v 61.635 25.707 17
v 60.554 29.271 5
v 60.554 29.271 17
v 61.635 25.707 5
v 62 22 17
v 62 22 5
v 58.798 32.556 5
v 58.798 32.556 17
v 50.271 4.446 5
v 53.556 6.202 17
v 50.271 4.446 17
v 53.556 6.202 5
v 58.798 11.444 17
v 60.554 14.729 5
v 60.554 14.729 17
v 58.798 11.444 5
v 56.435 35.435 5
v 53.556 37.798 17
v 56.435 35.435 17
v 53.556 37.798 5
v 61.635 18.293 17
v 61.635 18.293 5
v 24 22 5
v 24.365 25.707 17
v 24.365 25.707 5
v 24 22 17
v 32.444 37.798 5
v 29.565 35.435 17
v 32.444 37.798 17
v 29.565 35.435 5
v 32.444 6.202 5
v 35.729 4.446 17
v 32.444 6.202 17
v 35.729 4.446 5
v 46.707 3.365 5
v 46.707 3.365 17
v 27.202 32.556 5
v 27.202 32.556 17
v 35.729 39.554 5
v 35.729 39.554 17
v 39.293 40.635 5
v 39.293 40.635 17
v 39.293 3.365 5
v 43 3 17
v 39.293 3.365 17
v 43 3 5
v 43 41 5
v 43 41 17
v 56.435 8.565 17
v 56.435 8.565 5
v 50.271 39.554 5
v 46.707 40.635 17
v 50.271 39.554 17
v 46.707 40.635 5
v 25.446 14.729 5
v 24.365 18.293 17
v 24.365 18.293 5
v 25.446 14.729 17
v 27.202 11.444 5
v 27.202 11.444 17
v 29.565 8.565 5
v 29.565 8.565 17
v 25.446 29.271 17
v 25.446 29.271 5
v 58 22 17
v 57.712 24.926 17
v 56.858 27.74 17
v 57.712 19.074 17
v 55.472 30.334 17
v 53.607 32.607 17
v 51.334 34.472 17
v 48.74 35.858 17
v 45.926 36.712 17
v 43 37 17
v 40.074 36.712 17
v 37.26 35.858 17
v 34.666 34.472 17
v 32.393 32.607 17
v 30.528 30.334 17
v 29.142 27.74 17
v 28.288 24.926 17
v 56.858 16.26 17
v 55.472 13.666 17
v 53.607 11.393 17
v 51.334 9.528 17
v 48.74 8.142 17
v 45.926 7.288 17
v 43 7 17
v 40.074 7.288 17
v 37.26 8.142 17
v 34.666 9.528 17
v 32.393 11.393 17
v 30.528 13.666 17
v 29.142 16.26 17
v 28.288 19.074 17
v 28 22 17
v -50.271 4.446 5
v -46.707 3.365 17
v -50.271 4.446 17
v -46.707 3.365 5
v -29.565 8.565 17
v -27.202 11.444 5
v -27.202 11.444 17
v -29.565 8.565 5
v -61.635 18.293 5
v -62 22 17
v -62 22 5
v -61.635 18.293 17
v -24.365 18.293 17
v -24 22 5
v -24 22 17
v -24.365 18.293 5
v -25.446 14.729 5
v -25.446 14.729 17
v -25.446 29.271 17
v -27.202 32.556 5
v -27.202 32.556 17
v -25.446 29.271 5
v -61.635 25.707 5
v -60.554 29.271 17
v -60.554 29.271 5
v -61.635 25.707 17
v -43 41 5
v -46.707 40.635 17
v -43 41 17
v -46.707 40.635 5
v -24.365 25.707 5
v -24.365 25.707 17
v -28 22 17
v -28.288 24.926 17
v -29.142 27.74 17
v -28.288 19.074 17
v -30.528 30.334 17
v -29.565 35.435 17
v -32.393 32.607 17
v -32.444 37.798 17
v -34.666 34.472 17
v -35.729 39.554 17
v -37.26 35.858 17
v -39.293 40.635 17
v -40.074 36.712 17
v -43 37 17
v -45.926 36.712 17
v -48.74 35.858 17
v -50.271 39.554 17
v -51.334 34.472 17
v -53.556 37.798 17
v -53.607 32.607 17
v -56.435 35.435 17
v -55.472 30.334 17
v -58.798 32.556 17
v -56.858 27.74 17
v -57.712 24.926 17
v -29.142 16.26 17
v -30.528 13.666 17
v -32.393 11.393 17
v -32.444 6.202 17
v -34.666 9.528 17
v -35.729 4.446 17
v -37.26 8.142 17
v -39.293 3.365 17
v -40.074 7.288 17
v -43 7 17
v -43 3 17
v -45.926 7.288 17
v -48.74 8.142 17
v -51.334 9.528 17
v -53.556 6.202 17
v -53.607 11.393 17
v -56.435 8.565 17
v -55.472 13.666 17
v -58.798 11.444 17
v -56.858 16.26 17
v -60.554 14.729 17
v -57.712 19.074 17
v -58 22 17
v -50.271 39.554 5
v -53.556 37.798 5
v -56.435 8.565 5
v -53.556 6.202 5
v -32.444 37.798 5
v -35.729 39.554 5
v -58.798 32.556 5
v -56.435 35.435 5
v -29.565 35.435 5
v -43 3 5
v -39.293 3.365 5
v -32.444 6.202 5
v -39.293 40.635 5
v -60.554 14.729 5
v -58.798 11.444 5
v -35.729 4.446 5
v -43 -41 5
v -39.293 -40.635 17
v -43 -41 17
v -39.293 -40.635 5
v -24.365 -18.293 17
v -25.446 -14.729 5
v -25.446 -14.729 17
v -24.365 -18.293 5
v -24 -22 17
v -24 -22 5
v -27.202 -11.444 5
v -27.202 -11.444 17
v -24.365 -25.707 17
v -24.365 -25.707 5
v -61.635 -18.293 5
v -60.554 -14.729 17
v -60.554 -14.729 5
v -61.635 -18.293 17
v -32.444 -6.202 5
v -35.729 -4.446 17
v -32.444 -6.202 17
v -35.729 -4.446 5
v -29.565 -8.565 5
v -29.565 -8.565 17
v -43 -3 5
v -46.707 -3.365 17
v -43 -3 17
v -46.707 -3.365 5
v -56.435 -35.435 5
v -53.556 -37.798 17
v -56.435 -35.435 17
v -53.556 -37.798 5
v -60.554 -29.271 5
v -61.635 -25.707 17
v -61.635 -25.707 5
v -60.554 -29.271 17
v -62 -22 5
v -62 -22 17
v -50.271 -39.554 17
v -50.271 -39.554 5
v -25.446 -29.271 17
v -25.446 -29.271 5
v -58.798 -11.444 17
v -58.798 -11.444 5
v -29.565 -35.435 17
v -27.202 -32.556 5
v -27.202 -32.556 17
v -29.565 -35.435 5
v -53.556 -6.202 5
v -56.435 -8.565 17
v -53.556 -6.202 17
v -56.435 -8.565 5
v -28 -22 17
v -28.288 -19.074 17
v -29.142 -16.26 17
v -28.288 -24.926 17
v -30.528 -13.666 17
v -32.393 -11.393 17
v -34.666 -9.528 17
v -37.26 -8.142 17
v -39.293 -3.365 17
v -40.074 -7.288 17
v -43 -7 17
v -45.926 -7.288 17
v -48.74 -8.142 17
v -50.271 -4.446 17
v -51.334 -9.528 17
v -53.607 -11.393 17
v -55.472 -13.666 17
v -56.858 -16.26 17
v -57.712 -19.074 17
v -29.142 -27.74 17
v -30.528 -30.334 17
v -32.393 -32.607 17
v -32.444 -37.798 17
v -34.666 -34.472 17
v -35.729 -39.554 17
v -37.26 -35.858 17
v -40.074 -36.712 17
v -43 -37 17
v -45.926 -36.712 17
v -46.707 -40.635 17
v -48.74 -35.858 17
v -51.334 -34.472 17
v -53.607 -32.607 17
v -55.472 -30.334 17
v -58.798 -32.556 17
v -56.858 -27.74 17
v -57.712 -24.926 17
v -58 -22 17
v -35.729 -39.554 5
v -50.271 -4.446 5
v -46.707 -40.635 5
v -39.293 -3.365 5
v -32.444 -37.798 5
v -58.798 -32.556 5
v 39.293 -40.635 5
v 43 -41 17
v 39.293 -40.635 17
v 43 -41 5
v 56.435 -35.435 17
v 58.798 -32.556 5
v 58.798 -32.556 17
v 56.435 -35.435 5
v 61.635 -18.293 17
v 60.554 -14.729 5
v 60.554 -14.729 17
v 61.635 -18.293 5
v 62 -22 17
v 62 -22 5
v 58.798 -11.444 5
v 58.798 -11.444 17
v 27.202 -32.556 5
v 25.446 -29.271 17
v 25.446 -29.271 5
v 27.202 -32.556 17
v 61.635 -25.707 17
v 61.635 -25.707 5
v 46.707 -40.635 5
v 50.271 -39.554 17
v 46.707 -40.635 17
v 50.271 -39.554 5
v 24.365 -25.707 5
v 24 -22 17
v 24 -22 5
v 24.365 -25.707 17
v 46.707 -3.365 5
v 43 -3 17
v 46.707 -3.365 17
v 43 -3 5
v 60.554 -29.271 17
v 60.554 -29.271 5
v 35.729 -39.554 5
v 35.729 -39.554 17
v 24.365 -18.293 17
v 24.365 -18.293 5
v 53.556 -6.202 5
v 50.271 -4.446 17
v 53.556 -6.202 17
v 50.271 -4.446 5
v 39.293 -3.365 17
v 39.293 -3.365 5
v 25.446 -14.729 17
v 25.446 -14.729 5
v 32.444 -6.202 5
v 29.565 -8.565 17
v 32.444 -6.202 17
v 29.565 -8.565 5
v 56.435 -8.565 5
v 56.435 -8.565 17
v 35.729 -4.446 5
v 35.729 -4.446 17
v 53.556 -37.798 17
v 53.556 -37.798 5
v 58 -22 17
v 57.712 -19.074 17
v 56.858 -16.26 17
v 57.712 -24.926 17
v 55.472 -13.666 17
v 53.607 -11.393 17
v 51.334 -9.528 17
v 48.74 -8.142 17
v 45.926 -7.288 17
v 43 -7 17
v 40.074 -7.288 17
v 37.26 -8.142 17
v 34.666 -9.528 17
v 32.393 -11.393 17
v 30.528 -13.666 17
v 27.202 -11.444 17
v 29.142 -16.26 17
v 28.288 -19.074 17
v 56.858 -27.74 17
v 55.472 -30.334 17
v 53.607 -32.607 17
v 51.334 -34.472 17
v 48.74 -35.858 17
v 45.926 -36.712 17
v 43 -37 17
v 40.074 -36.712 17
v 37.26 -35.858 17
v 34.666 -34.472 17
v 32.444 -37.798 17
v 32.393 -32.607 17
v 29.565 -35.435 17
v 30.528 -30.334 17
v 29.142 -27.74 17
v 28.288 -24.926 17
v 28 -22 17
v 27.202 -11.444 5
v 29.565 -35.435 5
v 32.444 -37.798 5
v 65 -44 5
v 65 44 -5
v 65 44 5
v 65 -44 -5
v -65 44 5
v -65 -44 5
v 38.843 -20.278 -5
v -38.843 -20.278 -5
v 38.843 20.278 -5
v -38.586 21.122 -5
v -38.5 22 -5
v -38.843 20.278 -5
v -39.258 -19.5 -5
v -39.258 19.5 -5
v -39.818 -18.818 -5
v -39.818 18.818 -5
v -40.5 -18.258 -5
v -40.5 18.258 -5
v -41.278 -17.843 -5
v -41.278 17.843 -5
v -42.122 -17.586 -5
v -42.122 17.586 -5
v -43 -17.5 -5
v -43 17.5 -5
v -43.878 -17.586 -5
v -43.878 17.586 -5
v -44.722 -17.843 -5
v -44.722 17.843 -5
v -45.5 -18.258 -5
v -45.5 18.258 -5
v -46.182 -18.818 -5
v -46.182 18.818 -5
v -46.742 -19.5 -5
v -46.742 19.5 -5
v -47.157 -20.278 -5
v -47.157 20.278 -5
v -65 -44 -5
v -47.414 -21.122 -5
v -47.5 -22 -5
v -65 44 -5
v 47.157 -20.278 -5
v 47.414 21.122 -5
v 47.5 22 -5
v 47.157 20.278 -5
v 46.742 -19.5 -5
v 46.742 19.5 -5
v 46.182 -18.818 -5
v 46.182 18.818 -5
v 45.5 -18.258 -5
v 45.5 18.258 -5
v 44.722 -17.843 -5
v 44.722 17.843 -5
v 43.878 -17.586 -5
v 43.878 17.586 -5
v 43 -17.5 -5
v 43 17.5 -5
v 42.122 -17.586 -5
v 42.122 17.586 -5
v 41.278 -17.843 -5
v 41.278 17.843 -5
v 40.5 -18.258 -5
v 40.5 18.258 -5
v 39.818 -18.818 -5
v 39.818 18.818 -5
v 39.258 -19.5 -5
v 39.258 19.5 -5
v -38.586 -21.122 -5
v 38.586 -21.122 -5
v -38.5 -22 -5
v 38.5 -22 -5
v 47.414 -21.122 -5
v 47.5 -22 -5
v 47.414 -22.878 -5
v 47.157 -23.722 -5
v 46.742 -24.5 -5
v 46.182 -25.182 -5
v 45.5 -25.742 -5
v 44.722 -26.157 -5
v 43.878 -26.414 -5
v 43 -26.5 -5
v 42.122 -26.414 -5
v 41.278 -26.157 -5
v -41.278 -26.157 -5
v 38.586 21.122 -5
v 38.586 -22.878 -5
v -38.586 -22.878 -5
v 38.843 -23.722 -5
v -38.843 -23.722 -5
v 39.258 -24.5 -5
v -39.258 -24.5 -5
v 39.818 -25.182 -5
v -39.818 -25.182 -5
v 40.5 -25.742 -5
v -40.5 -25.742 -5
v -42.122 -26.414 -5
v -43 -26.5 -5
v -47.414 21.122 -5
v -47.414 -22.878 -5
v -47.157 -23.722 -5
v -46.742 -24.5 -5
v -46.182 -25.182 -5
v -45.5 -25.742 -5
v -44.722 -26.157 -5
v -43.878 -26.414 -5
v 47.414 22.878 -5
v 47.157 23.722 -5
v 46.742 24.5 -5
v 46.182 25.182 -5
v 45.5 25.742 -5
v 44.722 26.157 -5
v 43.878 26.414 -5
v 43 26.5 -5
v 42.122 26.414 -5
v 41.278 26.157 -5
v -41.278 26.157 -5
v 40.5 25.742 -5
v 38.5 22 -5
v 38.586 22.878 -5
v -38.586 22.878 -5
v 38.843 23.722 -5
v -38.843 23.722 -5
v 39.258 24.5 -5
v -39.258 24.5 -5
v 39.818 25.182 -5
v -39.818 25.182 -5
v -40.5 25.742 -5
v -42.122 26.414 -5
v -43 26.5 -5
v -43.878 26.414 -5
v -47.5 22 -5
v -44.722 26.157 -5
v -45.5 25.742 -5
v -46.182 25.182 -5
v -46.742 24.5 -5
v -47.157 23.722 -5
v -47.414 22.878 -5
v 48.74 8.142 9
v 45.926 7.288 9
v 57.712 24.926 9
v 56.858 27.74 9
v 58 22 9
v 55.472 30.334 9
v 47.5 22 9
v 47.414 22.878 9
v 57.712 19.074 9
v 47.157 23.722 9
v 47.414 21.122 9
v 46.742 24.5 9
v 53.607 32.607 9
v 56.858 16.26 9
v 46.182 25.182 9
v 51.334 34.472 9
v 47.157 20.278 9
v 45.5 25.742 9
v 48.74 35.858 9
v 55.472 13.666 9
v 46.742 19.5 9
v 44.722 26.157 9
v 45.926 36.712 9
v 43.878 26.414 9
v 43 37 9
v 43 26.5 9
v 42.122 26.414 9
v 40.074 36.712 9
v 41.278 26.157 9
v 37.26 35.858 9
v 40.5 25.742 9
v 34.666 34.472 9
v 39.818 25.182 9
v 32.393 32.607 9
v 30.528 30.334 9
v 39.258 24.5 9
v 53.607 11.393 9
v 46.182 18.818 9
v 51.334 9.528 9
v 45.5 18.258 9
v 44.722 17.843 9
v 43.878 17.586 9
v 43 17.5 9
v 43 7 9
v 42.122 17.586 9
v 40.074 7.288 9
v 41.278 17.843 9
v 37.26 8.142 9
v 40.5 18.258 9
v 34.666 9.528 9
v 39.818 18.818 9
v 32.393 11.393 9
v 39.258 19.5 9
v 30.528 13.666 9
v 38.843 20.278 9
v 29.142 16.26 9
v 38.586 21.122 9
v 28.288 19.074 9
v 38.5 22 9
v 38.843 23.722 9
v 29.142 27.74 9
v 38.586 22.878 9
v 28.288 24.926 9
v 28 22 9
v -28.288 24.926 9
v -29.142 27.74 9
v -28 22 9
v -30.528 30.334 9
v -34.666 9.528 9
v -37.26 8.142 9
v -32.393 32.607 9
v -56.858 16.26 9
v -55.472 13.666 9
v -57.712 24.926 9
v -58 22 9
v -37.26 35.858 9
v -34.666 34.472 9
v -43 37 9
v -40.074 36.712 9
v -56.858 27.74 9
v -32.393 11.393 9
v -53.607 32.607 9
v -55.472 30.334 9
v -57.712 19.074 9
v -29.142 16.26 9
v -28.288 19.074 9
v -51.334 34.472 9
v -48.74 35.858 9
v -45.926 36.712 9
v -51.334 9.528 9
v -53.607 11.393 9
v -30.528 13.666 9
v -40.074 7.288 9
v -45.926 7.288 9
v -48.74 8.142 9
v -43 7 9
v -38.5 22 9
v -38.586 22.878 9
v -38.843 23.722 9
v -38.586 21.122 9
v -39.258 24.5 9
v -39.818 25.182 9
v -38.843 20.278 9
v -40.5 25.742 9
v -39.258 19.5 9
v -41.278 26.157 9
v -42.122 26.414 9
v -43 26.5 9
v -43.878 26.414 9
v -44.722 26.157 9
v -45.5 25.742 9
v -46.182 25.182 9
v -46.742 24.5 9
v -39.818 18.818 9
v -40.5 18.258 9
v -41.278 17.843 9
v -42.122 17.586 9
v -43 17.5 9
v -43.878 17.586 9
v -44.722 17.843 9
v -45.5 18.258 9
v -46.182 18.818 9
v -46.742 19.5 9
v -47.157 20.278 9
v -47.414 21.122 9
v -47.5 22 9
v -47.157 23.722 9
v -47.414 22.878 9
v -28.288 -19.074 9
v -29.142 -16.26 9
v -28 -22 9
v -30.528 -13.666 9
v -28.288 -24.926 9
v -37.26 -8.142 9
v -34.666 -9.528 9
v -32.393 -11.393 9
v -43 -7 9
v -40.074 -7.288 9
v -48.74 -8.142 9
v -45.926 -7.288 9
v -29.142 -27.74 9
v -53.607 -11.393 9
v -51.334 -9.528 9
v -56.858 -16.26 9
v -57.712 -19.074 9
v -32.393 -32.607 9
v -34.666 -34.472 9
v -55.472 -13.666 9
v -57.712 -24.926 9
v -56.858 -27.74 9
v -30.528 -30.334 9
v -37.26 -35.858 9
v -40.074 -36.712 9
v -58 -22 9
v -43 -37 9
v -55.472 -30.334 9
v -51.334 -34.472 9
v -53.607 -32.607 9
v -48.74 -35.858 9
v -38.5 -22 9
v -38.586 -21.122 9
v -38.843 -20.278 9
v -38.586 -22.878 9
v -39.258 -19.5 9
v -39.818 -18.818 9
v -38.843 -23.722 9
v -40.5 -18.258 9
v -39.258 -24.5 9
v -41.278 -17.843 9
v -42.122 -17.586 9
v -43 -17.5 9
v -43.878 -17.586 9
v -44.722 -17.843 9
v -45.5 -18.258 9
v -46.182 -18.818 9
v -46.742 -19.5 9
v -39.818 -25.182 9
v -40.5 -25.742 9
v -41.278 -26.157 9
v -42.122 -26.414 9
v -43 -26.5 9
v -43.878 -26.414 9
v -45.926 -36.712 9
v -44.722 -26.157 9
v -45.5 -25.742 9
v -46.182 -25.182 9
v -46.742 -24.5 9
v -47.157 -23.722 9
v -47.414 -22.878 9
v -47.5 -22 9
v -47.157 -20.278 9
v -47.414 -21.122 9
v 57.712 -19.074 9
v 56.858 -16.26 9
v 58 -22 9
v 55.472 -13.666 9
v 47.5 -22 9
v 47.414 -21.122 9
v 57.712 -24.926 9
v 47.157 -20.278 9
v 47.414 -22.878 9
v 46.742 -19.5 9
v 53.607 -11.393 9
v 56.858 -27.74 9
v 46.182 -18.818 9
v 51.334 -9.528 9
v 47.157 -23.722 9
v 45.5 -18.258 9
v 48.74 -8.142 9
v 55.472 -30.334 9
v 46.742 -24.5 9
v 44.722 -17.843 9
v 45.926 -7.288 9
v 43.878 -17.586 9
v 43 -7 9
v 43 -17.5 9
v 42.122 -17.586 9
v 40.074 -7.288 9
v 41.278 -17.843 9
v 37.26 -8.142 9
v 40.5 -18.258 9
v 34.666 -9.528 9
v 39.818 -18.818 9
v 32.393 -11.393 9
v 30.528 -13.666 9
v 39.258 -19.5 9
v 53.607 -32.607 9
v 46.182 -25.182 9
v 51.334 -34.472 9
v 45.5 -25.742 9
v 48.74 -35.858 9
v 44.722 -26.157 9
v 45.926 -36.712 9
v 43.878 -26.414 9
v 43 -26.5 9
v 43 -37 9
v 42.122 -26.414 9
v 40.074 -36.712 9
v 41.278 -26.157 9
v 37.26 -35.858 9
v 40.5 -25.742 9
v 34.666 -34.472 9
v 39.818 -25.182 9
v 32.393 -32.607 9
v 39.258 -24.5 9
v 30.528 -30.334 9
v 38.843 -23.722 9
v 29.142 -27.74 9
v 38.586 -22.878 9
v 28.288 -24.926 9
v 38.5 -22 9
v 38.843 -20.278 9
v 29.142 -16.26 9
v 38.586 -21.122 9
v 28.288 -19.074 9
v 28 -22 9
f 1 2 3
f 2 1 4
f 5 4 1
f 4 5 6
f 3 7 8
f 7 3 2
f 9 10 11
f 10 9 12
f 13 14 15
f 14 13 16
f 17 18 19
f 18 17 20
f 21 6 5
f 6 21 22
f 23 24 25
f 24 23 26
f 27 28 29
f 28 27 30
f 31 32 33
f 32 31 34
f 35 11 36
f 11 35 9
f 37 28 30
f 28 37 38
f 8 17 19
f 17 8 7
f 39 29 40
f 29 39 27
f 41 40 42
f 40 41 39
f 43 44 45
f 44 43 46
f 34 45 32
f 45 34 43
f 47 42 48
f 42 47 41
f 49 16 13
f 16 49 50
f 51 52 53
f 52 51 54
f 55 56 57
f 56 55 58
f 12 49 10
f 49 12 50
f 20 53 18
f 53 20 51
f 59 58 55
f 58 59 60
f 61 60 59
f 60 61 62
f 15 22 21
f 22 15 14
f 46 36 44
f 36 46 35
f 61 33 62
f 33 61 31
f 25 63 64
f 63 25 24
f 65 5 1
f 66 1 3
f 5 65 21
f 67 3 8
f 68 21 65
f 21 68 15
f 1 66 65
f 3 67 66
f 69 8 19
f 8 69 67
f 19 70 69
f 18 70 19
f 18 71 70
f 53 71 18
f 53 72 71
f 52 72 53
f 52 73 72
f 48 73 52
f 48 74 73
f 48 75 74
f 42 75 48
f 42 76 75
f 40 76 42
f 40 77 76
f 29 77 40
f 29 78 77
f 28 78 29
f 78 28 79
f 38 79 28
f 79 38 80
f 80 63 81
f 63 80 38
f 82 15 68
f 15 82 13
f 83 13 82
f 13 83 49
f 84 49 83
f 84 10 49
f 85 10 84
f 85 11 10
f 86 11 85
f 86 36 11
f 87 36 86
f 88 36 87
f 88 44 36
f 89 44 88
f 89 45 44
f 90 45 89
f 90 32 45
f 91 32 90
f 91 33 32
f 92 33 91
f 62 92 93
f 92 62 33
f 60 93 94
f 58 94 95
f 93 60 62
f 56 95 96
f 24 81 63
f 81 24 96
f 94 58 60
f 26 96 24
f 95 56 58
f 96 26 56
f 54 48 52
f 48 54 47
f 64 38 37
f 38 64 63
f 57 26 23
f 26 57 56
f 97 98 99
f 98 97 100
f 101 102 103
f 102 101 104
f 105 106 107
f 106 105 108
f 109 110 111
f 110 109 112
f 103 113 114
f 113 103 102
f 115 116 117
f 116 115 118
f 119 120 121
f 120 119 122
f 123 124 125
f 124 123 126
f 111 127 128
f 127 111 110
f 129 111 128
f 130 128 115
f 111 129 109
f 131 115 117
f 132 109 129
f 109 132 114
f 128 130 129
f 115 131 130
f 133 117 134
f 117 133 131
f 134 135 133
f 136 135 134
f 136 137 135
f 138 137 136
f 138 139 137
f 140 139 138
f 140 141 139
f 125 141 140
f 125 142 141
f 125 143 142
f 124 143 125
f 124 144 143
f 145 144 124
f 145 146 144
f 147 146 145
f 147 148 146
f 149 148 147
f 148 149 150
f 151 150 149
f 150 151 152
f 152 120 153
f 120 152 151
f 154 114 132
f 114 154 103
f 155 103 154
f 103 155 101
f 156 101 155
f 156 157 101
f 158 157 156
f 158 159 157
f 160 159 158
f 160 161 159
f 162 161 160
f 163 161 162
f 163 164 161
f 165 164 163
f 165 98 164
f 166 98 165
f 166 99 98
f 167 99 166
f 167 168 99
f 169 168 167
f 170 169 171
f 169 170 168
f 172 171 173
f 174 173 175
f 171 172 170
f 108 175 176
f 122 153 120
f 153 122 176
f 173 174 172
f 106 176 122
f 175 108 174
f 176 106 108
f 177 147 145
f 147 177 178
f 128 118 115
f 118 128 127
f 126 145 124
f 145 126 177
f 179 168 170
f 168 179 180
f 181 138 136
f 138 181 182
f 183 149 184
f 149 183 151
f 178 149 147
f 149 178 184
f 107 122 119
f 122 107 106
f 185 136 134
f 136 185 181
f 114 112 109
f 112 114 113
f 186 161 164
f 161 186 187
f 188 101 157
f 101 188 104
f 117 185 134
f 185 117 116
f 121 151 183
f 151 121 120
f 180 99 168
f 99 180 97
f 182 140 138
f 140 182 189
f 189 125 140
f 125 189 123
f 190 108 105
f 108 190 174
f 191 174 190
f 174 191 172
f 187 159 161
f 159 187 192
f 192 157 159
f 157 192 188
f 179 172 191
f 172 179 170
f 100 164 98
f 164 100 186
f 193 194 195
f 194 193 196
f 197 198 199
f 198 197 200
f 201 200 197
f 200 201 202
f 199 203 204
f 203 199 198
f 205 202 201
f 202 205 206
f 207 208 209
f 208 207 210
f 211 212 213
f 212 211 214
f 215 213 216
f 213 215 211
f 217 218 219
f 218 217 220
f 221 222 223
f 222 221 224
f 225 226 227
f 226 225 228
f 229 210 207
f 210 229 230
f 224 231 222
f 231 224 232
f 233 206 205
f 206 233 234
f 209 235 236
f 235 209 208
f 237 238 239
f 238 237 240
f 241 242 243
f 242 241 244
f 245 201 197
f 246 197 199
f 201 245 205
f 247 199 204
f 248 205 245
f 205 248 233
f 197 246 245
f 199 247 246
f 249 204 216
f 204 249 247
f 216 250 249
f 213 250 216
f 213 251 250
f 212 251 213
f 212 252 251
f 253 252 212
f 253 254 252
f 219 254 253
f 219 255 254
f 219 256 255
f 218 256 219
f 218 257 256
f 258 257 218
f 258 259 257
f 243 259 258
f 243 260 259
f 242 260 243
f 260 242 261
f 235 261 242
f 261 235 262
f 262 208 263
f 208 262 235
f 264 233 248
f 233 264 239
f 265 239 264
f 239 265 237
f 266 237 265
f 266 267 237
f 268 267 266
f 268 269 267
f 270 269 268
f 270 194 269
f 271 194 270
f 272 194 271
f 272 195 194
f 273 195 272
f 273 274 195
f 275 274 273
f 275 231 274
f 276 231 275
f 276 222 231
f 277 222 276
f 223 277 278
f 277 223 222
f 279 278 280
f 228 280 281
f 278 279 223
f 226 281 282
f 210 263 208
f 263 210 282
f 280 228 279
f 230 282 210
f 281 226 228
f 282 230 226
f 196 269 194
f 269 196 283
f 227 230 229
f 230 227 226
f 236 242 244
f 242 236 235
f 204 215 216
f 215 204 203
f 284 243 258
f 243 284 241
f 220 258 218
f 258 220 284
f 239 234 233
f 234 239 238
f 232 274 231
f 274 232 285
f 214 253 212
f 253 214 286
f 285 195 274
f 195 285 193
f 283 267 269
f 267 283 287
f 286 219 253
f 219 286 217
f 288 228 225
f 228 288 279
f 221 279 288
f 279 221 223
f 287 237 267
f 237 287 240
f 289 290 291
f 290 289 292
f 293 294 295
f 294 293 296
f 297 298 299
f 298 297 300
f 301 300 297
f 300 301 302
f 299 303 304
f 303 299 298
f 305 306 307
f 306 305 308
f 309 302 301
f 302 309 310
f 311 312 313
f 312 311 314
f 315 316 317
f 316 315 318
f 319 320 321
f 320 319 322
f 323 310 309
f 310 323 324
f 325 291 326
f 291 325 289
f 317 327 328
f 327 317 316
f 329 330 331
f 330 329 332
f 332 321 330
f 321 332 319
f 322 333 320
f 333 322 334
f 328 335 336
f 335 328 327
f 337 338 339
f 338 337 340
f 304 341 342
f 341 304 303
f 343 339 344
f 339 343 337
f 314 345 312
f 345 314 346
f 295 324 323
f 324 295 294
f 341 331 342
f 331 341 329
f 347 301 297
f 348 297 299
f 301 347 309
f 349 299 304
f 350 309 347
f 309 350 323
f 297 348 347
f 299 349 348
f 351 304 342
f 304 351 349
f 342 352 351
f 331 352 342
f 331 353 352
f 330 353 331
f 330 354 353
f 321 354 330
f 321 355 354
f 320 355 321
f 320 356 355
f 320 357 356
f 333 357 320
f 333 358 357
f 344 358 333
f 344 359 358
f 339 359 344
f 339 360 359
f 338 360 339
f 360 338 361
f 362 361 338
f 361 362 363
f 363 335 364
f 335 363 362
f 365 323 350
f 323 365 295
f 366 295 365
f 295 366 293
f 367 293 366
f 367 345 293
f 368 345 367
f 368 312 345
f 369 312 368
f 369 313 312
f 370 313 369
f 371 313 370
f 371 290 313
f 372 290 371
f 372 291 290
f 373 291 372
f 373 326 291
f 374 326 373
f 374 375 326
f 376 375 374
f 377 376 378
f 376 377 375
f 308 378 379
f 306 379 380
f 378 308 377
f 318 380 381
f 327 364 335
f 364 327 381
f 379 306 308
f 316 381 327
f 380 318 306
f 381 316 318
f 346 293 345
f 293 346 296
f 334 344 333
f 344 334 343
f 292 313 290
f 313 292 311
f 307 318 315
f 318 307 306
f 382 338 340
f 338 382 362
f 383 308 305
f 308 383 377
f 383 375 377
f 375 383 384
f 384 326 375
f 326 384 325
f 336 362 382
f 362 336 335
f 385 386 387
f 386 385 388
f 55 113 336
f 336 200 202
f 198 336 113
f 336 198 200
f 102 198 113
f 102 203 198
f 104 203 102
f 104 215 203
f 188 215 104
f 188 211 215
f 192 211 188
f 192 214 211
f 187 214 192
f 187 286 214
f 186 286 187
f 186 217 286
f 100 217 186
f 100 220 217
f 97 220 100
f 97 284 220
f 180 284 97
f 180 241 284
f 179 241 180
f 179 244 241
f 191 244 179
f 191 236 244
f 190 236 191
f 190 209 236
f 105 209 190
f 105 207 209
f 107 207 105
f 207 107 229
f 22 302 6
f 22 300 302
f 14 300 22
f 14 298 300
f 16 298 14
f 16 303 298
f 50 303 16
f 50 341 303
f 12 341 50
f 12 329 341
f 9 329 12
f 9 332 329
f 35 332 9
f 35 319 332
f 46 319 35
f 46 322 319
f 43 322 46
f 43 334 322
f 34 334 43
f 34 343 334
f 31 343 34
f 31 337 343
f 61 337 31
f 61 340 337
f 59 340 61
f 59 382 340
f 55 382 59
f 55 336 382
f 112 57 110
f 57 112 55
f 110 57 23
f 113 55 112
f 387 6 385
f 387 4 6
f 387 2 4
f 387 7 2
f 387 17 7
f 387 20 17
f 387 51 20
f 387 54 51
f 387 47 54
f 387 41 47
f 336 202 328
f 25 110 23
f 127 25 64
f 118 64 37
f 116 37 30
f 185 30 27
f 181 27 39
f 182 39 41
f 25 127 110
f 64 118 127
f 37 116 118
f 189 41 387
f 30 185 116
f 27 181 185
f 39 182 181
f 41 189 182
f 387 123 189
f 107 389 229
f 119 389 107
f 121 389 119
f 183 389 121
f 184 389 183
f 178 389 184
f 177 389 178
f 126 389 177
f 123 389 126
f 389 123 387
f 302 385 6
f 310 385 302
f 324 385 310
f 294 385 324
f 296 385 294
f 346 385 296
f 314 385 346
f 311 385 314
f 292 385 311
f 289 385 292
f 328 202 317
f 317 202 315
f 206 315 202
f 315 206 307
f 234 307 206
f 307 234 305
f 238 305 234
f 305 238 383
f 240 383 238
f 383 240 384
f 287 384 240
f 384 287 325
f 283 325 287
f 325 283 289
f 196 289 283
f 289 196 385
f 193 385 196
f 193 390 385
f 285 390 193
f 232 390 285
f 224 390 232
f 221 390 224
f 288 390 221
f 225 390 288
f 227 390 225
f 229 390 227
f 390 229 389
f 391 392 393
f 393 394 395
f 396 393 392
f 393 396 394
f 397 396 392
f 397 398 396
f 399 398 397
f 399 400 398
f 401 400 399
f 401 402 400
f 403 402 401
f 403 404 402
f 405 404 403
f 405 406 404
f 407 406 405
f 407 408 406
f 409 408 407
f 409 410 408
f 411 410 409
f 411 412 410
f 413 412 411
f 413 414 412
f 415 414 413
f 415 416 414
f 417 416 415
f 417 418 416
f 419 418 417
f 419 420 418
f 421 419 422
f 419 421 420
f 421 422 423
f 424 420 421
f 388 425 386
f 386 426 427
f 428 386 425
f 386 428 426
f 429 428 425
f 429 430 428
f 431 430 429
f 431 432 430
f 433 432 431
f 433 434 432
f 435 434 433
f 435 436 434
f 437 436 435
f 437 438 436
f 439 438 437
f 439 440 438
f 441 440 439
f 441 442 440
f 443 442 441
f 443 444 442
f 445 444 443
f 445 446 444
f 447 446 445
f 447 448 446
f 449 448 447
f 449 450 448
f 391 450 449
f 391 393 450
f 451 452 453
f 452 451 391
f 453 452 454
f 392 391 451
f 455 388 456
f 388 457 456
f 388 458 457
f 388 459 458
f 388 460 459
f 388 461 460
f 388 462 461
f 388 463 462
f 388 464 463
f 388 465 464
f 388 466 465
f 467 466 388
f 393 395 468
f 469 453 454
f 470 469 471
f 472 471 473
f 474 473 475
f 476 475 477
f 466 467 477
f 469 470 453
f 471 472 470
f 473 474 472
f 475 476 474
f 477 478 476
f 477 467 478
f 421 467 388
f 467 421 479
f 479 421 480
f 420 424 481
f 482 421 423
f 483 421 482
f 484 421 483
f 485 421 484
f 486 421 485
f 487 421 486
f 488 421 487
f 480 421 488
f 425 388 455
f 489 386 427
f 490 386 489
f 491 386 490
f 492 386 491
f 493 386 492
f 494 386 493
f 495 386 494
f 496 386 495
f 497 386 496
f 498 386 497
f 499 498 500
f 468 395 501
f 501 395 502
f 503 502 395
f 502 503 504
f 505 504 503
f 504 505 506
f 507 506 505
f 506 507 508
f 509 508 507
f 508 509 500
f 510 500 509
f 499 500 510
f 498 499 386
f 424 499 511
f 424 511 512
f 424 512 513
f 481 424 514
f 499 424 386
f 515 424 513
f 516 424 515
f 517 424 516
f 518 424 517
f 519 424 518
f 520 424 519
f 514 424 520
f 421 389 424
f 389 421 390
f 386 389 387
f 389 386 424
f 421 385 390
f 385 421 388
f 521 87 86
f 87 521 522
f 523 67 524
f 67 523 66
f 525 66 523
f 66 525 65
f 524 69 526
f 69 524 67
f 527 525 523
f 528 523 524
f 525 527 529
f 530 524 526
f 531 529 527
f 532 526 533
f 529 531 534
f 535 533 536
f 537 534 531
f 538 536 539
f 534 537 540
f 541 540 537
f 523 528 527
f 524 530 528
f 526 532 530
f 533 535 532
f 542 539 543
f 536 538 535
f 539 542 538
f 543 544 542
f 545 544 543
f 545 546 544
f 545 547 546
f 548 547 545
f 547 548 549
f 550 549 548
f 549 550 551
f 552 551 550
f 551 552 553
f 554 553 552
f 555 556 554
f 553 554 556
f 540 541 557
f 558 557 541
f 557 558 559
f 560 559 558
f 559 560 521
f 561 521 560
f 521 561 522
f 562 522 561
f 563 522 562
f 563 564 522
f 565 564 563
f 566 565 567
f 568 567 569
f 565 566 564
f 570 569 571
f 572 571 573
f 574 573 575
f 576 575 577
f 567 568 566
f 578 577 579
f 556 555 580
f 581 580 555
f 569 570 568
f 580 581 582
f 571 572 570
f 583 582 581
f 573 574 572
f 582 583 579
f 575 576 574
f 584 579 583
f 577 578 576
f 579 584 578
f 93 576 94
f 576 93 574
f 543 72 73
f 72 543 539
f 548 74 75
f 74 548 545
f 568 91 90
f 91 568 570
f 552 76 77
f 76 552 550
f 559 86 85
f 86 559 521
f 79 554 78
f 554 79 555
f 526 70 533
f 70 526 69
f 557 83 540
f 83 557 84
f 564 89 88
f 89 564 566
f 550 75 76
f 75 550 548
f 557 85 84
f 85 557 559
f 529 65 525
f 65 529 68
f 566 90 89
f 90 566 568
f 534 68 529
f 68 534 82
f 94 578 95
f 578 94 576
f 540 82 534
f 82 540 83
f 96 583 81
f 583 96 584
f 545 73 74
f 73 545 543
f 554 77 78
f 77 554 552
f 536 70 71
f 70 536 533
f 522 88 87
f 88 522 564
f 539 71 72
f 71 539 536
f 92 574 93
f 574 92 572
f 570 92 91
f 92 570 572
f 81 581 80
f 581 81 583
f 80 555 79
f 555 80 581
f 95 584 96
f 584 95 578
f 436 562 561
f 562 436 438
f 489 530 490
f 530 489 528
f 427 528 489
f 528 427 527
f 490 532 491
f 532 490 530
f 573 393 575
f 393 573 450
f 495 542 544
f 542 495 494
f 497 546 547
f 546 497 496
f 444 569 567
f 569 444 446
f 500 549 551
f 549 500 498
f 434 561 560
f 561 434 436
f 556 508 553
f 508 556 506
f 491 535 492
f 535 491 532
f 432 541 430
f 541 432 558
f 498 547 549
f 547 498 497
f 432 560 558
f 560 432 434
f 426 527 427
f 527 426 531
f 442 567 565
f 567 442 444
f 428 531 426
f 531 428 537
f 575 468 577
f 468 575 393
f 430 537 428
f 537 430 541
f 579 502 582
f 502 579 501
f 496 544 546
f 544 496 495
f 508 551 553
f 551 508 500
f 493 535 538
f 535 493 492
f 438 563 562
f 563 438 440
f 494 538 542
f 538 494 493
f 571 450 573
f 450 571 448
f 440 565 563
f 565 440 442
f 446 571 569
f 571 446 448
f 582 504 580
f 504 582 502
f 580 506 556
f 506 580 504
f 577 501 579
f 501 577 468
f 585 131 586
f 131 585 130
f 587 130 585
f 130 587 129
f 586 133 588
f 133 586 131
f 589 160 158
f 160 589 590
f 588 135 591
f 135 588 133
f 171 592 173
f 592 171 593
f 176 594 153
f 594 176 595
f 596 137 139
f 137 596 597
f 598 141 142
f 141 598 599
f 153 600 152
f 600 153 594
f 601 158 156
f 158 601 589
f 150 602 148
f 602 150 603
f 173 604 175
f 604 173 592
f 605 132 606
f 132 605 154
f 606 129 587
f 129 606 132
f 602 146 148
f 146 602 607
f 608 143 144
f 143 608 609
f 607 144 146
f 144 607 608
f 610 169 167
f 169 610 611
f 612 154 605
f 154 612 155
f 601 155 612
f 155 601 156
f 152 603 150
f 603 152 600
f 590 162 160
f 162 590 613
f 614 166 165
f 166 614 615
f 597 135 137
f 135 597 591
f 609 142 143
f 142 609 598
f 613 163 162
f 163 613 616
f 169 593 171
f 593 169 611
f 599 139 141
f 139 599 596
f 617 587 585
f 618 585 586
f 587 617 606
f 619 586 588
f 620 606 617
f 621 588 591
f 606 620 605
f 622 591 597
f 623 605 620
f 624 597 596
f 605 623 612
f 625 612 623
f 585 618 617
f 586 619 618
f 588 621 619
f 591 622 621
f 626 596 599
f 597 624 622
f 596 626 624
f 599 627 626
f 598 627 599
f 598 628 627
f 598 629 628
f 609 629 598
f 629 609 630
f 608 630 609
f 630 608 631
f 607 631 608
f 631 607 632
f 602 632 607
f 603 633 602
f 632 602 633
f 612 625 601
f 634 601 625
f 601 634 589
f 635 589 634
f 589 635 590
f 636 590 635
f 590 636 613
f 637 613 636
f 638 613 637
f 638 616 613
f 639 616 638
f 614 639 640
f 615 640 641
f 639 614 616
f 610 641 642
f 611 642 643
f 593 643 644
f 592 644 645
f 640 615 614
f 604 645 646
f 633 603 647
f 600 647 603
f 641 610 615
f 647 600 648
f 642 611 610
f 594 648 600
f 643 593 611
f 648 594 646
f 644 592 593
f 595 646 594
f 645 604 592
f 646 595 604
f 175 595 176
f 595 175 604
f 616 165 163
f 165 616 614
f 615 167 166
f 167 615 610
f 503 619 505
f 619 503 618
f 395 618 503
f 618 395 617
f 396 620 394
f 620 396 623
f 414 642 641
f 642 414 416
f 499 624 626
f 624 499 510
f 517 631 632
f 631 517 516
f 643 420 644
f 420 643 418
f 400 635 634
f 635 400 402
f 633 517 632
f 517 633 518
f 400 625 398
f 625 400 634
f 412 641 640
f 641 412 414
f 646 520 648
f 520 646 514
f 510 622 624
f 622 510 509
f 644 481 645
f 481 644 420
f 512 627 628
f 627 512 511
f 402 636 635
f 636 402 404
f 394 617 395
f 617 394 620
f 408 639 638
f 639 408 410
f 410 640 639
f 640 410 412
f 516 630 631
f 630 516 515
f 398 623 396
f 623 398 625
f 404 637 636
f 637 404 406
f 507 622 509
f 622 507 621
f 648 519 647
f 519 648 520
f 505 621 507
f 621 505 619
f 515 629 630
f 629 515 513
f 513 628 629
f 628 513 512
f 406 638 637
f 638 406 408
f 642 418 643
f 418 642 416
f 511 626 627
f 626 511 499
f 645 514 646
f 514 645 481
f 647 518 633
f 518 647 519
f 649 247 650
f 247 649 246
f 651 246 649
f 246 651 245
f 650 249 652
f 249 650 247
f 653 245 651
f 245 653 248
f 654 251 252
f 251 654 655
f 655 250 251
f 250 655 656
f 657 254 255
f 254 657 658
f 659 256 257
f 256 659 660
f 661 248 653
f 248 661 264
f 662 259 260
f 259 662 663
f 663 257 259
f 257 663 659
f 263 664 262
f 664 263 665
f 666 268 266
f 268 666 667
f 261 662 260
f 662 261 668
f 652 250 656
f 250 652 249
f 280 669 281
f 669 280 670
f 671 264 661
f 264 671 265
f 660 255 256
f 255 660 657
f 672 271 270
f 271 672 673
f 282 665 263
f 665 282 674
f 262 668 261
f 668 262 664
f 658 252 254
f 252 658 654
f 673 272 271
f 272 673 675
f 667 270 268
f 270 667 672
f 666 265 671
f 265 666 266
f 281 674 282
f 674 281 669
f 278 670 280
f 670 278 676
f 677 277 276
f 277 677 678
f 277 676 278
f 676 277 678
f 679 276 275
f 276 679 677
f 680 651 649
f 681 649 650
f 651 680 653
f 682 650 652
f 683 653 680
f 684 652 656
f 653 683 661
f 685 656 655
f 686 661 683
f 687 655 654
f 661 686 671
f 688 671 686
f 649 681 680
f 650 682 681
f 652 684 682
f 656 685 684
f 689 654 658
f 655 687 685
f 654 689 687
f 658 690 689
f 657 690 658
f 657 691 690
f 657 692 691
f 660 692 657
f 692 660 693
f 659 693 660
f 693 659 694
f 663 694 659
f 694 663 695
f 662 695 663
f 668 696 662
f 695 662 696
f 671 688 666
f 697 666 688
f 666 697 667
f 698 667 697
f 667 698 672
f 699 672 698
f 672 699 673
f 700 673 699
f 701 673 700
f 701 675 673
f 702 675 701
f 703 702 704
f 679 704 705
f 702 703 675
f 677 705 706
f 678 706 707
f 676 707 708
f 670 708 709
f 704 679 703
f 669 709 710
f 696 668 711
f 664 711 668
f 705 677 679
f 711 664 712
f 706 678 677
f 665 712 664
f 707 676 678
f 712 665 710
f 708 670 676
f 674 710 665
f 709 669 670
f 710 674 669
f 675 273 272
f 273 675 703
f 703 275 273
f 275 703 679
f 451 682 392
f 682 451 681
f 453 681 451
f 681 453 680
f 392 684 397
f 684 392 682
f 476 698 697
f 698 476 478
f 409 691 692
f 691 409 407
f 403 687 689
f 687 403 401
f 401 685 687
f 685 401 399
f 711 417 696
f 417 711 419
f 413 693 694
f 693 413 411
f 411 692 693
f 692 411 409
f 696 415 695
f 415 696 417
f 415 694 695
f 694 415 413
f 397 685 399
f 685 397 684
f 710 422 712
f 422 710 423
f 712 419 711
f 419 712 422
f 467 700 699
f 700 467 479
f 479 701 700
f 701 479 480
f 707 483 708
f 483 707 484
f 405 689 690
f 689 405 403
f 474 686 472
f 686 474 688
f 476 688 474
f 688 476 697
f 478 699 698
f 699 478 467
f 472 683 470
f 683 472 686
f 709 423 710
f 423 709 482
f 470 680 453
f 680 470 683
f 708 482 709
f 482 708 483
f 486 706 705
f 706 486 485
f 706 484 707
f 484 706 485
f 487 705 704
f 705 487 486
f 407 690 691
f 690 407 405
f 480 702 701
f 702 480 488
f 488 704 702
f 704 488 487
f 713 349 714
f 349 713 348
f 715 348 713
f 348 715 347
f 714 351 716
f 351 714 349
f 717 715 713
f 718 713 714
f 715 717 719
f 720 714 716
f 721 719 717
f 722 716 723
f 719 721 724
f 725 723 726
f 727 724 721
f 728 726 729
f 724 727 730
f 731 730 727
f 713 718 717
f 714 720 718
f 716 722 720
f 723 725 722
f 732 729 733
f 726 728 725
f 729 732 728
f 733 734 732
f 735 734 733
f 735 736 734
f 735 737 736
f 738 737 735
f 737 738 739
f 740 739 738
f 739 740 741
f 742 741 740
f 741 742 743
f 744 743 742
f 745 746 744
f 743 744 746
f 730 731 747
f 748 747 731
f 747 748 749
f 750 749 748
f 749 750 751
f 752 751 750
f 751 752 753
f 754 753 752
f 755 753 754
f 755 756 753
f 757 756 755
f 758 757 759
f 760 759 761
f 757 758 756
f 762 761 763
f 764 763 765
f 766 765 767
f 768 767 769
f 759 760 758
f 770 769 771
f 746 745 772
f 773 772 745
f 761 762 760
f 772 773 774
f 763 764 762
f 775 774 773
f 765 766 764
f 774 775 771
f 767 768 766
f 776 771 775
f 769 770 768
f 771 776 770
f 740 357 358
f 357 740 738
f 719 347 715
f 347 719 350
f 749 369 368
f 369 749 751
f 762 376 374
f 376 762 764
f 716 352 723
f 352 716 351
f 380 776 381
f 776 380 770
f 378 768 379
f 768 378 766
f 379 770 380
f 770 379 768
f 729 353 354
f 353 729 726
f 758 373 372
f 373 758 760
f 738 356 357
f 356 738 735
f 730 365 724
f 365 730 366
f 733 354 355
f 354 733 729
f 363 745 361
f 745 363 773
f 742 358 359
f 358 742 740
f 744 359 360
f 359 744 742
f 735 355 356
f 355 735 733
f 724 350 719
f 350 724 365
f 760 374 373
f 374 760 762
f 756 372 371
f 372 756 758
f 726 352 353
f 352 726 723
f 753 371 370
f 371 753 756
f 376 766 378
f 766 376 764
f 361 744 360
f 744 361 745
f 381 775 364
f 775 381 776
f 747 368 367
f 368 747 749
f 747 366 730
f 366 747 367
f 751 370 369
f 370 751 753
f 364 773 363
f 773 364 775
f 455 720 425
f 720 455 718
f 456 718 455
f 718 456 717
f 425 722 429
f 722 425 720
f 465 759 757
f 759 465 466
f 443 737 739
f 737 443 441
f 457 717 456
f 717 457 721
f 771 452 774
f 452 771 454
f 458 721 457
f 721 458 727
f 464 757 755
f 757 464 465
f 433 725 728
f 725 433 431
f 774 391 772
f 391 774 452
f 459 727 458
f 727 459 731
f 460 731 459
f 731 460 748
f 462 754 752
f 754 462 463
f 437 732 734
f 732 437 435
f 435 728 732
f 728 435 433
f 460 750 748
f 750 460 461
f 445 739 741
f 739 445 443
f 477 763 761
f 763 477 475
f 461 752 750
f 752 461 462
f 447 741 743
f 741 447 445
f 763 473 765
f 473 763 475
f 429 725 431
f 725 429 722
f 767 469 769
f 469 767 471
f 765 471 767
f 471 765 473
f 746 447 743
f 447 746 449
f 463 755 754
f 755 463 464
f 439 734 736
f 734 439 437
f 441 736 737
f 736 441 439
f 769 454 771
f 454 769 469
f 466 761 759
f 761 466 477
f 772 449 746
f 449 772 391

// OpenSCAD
$fn = 32;

// ----------------------------------------------------------------------
// Socket pad plate
// bosses with counterbored sockets for the screws
// ----------------------------------------------------------------------

// --- parameters (mm) ---
base_t = 10;            // base plate thickness
boss_h = 12;            // boss height above the base plate
boss_d = 38;            // boss diameter
socket_d = 30;          // socket diameter
socket_depth = 8;       // socket depth from the boss face
bolt_d = 9;             // screw clearance hole through the socket floor
plate = [130, 88, 10];  // overall size (x, y, z)
edge = 22;              // boss centre offset from the plate edge
pads = 4;               // boss count, one per corner

// --- derived feature positions (mm) ---
height = base_t + boss_h;        // = 22   overall height of the part
corner_x = plate[0] / 2 - edge;  // = 43   boss centre X
corner_y = plate[1] / 2 - edge;  // = 22   boss centre Y
feature_centers = [
  [corner_x, corner_y],
  [-corner_x, corner_y],
  [-corner_x, -corner_y],
  [corner_x, -corner_y]
];   // boss centres: sockets, holes and the pads themselves are placed from here

// base plate, bosses on feature_centers, socket + through hole in each
difference() {
  union() {
    cube(plate, center = true);
    for (centre = feature_centers)
      translate([centre[0], centre[1], plate[2] / 2 - 1])
        cylinder(d = boss_d, h = boss_h + 1);
  }
  for (centre = feature_centers) {
    translate([centre[0], centre[1], plate[2] / 2 + boss_h - socket_depth])
      cylinder(d = socket_d, h = socket_depth + 1);
    translate([centre[0], centre[1], -height])
      cylinder(d = bolt_d, h = 2 * height + 2);  // through the socket floor
  }
}
